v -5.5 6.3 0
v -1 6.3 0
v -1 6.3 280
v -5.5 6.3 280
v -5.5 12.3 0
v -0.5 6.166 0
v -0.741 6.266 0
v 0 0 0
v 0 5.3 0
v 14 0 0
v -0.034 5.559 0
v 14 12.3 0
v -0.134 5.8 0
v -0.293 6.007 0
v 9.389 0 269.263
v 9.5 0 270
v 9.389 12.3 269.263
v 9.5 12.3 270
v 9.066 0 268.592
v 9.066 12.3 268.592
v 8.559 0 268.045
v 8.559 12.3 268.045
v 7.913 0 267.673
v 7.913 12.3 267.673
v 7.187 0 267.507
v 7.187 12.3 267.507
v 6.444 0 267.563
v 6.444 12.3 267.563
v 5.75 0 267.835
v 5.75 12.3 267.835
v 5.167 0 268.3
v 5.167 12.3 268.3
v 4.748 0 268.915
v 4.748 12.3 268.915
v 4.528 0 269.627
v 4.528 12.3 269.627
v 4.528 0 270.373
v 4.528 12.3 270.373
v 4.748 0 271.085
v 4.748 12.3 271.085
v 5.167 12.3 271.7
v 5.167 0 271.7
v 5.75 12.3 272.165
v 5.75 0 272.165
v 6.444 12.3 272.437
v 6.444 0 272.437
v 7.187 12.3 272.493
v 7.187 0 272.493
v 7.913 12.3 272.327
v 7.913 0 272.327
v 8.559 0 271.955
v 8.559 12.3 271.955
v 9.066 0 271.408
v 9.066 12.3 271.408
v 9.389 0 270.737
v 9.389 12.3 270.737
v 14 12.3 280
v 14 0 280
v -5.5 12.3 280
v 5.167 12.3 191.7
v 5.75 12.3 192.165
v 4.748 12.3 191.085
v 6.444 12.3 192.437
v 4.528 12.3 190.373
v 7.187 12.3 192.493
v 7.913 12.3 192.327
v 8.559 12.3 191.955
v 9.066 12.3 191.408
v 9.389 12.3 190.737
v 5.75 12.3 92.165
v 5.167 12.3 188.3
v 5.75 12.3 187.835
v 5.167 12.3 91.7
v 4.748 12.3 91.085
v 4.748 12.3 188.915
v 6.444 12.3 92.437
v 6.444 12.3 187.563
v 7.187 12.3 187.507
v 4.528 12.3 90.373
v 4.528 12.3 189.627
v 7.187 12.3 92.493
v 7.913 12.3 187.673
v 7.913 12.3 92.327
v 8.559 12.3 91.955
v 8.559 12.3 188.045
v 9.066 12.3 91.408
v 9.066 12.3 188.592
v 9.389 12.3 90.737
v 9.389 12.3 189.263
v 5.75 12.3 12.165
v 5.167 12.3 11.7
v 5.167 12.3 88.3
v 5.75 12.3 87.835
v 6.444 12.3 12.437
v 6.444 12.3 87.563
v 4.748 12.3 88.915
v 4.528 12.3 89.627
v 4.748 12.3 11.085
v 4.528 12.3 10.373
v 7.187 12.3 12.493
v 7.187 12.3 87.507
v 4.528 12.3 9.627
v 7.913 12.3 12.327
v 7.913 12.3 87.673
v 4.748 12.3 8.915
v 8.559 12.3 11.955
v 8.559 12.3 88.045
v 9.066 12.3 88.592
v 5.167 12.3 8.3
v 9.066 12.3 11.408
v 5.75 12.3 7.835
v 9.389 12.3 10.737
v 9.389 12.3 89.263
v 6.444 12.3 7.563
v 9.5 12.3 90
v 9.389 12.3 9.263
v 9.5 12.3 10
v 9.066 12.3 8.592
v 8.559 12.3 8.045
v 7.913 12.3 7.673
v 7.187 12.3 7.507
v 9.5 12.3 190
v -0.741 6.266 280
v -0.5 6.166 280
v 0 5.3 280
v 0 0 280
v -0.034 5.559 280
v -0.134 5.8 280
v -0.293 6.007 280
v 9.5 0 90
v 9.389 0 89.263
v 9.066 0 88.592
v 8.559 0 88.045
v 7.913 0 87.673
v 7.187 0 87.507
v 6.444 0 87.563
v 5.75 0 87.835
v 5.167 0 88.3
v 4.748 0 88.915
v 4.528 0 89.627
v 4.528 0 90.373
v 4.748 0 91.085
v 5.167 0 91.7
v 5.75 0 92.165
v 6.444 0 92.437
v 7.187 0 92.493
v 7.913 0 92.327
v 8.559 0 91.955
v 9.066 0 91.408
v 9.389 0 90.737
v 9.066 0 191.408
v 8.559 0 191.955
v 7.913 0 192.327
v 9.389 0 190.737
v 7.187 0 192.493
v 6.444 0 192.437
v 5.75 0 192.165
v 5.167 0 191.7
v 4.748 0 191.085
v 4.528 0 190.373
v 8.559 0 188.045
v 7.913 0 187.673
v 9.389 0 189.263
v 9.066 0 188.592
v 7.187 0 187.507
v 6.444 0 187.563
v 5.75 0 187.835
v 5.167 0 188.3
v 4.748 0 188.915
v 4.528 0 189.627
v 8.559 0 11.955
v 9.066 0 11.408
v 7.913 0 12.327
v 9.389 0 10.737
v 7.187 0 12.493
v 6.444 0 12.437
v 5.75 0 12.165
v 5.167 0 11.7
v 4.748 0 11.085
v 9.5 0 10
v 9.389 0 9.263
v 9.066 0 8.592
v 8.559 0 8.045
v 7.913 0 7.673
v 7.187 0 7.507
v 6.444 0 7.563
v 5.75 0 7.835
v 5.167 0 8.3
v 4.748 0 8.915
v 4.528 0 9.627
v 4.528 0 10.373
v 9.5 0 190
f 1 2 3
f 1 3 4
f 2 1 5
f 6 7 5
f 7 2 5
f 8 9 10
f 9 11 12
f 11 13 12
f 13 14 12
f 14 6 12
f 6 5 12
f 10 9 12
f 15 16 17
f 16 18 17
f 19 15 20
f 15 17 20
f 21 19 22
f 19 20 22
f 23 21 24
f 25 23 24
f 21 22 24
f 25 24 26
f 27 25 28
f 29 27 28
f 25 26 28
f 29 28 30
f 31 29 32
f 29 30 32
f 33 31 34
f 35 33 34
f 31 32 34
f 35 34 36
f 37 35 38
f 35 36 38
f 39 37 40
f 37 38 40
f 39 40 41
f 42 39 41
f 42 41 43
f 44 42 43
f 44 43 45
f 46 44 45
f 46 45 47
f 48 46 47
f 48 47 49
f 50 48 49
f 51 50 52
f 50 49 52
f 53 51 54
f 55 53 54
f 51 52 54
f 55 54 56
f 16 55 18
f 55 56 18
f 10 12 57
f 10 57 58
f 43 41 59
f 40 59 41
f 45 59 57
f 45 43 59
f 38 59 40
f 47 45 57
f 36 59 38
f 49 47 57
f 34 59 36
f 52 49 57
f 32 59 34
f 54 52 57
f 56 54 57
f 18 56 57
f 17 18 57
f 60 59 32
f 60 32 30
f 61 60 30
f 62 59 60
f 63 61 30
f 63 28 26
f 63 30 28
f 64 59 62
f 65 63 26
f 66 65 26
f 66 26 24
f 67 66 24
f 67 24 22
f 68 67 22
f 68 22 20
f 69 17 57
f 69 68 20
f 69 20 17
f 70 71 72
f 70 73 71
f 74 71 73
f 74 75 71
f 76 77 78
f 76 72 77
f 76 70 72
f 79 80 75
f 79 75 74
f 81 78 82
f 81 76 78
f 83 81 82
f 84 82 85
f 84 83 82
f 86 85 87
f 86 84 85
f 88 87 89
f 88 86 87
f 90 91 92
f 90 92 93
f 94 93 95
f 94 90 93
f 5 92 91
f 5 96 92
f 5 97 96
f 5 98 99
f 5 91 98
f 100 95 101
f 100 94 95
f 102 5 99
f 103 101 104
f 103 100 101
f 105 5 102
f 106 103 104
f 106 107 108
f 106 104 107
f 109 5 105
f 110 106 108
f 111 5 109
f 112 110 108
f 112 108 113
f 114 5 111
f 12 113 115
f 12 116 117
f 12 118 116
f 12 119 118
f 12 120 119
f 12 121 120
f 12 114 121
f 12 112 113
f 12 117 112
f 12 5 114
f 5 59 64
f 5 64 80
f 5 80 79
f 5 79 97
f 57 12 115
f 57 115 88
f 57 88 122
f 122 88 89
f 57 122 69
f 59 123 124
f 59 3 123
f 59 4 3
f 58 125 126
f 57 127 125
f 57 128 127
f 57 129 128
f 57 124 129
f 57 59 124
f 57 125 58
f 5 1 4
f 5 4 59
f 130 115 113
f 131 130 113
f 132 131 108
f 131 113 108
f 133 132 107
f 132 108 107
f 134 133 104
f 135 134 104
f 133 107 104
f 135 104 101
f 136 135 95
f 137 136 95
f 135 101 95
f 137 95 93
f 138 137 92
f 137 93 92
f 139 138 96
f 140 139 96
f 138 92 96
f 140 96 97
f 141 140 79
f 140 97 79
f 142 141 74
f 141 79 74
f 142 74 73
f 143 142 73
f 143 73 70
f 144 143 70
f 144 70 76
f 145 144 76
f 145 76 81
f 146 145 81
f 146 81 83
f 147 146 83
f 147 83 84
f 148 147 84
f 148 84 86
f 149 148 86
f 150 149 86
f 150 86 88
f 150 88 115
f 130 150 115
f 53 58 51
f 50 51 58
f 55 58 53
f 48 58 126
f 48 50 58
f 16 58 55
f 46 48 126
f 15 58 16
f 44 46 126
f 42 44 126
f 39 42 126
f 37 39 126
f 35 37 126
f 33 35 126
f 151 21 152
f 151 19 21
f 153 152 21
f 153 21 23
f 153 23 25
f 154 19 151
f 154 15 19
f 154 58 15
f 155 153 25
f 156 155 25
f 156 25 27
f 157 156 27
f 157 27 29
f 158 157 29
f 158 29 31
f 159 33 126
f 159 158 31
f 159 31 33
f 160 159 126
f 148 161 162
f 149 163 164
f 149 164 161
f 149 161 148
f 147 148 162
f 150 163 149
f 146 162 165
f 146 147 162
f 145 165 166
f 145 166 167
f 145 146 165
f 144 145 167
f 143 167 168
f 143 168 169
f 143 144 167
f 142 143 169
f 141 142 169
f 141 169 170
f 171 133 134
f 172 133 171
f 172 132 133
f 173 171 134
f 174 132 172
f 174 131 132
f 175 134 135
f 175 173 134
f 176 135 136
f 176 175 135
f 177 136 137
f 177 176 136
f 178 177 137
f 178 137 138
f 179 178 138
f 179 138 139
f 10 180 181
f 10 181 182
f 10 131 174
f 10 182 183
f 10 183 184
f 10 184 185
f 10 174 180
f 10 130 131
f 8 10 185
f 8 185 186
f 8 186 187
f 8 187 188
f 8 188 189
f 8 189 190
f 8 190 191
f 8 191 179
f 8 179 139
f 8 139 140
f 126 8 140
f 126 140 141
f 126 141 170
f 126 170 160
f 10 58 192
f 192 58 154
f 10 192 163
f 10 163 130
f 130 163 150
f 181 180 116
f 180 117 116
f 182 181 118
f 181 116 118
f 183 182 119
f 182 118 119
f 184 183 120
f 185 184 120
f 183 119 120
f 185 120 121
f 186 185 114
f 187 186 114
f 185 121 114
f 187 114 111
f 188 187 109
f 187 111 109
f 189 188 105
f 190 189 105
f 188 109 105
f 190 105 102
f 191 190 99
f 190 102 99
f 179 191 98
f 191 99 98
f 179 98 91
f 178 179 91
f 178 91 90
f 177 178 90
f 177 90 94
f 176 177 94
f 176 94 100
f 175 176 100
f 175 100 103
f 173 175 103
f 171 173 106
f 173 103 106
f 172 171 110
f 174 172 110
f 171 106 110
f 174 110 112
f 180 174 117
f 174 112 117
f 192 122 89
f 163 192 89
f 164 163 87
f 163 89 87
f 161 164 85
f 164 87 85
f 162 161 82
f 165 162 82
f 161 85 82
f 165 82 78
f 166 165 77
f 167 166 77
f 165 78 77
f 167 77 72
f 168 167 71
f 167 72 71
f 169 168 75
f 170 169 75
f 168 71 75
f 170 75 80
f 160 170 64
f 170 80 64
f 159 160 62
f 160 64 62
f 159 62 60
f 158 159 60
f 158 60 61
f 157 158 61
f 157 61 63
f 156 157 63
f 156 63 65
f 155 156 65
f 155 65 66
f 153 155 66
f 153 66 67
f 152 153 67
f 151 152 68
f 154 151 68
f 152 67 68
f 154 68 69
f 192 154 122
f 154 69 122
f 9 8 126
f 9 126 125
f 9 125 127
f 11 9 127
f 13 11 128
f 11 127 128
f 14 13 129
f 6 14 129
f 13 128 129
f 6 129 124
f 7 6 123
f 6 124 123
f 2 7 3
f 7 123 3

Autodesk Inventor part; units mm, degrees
ref_plane "YZ Plane" through (0, 0, 0) normal (1, 0, 0) x (0, 1, 0)
ref_plane "XZ Plane" through (0, 0, 0) normal (0, 1, 0) x (-1, 0, 0)
ref_plane "XY Plane" through (0, 0, 0) normal (0, 0, 1) x (1, 0, 0)
sketch "Sketch1" plane through (0, 0, 0) normal (0, 0, 1) x (1, 0, 0)
  line L0 (14, 12.3) -> (14, 0)
  line L1 (14, 0) -> (0, 0)
  line L2 (0, 0) -> (0, 6.3)
  line L3 (-5.5, 12.3) -> (14, 12.3)
  line L4 (0, 6.3) -> (-5.5, 6.3)
  line L5 (-5.5, 6.3) -> (-5.5, 12.3)
  dimension "d1" = 6.3
  dimension "d2" = 6
  dimension "d4" = 14
  dimension "d5" = 5.5
extrude "Extrusion1" add sketch "Sketch1" along normal blind 280
sketch "Sketch2" plane through (-5.5, 12.3, 0) normal (0, 1, 0) x (1, 0, 0)
  circle A0 centre (12.5, -270) radius 2.5
  circle A1 centre (12.5, -10) radius 2.5
  circle A2 centre (12.5, -190) radius 2.5
  line L0 (19.5, -280) -> (0, -280) projected
  line L1 (19.5, 0) -> (19.5, -280) projected
  line L2 (19.5, 0) -> (0, 0) projected
  circle A3 centre (12.5, -90) radius 2.5
  point P0 (5.5, 0)
  dimension "d8" = 5
  dimension "d9" = 10
  dimension "d10" = 7
  dimension "d11" = 10
  dimension "d12" = 7
  dimension "d13" = 7
  dimension "d14" = 90
  dimension "d15" = 5
  dimension "d16" = 90
  dimension "d17" = 7
extrude "Extrusion2" cut sketch "Sketch2" against normal through all
fillet "Fillet1" radius 1 1 edges at (0, 6.3, 140)
properties part number "1324_Clamp Rail_V1" material "Acetal Resin, White"
